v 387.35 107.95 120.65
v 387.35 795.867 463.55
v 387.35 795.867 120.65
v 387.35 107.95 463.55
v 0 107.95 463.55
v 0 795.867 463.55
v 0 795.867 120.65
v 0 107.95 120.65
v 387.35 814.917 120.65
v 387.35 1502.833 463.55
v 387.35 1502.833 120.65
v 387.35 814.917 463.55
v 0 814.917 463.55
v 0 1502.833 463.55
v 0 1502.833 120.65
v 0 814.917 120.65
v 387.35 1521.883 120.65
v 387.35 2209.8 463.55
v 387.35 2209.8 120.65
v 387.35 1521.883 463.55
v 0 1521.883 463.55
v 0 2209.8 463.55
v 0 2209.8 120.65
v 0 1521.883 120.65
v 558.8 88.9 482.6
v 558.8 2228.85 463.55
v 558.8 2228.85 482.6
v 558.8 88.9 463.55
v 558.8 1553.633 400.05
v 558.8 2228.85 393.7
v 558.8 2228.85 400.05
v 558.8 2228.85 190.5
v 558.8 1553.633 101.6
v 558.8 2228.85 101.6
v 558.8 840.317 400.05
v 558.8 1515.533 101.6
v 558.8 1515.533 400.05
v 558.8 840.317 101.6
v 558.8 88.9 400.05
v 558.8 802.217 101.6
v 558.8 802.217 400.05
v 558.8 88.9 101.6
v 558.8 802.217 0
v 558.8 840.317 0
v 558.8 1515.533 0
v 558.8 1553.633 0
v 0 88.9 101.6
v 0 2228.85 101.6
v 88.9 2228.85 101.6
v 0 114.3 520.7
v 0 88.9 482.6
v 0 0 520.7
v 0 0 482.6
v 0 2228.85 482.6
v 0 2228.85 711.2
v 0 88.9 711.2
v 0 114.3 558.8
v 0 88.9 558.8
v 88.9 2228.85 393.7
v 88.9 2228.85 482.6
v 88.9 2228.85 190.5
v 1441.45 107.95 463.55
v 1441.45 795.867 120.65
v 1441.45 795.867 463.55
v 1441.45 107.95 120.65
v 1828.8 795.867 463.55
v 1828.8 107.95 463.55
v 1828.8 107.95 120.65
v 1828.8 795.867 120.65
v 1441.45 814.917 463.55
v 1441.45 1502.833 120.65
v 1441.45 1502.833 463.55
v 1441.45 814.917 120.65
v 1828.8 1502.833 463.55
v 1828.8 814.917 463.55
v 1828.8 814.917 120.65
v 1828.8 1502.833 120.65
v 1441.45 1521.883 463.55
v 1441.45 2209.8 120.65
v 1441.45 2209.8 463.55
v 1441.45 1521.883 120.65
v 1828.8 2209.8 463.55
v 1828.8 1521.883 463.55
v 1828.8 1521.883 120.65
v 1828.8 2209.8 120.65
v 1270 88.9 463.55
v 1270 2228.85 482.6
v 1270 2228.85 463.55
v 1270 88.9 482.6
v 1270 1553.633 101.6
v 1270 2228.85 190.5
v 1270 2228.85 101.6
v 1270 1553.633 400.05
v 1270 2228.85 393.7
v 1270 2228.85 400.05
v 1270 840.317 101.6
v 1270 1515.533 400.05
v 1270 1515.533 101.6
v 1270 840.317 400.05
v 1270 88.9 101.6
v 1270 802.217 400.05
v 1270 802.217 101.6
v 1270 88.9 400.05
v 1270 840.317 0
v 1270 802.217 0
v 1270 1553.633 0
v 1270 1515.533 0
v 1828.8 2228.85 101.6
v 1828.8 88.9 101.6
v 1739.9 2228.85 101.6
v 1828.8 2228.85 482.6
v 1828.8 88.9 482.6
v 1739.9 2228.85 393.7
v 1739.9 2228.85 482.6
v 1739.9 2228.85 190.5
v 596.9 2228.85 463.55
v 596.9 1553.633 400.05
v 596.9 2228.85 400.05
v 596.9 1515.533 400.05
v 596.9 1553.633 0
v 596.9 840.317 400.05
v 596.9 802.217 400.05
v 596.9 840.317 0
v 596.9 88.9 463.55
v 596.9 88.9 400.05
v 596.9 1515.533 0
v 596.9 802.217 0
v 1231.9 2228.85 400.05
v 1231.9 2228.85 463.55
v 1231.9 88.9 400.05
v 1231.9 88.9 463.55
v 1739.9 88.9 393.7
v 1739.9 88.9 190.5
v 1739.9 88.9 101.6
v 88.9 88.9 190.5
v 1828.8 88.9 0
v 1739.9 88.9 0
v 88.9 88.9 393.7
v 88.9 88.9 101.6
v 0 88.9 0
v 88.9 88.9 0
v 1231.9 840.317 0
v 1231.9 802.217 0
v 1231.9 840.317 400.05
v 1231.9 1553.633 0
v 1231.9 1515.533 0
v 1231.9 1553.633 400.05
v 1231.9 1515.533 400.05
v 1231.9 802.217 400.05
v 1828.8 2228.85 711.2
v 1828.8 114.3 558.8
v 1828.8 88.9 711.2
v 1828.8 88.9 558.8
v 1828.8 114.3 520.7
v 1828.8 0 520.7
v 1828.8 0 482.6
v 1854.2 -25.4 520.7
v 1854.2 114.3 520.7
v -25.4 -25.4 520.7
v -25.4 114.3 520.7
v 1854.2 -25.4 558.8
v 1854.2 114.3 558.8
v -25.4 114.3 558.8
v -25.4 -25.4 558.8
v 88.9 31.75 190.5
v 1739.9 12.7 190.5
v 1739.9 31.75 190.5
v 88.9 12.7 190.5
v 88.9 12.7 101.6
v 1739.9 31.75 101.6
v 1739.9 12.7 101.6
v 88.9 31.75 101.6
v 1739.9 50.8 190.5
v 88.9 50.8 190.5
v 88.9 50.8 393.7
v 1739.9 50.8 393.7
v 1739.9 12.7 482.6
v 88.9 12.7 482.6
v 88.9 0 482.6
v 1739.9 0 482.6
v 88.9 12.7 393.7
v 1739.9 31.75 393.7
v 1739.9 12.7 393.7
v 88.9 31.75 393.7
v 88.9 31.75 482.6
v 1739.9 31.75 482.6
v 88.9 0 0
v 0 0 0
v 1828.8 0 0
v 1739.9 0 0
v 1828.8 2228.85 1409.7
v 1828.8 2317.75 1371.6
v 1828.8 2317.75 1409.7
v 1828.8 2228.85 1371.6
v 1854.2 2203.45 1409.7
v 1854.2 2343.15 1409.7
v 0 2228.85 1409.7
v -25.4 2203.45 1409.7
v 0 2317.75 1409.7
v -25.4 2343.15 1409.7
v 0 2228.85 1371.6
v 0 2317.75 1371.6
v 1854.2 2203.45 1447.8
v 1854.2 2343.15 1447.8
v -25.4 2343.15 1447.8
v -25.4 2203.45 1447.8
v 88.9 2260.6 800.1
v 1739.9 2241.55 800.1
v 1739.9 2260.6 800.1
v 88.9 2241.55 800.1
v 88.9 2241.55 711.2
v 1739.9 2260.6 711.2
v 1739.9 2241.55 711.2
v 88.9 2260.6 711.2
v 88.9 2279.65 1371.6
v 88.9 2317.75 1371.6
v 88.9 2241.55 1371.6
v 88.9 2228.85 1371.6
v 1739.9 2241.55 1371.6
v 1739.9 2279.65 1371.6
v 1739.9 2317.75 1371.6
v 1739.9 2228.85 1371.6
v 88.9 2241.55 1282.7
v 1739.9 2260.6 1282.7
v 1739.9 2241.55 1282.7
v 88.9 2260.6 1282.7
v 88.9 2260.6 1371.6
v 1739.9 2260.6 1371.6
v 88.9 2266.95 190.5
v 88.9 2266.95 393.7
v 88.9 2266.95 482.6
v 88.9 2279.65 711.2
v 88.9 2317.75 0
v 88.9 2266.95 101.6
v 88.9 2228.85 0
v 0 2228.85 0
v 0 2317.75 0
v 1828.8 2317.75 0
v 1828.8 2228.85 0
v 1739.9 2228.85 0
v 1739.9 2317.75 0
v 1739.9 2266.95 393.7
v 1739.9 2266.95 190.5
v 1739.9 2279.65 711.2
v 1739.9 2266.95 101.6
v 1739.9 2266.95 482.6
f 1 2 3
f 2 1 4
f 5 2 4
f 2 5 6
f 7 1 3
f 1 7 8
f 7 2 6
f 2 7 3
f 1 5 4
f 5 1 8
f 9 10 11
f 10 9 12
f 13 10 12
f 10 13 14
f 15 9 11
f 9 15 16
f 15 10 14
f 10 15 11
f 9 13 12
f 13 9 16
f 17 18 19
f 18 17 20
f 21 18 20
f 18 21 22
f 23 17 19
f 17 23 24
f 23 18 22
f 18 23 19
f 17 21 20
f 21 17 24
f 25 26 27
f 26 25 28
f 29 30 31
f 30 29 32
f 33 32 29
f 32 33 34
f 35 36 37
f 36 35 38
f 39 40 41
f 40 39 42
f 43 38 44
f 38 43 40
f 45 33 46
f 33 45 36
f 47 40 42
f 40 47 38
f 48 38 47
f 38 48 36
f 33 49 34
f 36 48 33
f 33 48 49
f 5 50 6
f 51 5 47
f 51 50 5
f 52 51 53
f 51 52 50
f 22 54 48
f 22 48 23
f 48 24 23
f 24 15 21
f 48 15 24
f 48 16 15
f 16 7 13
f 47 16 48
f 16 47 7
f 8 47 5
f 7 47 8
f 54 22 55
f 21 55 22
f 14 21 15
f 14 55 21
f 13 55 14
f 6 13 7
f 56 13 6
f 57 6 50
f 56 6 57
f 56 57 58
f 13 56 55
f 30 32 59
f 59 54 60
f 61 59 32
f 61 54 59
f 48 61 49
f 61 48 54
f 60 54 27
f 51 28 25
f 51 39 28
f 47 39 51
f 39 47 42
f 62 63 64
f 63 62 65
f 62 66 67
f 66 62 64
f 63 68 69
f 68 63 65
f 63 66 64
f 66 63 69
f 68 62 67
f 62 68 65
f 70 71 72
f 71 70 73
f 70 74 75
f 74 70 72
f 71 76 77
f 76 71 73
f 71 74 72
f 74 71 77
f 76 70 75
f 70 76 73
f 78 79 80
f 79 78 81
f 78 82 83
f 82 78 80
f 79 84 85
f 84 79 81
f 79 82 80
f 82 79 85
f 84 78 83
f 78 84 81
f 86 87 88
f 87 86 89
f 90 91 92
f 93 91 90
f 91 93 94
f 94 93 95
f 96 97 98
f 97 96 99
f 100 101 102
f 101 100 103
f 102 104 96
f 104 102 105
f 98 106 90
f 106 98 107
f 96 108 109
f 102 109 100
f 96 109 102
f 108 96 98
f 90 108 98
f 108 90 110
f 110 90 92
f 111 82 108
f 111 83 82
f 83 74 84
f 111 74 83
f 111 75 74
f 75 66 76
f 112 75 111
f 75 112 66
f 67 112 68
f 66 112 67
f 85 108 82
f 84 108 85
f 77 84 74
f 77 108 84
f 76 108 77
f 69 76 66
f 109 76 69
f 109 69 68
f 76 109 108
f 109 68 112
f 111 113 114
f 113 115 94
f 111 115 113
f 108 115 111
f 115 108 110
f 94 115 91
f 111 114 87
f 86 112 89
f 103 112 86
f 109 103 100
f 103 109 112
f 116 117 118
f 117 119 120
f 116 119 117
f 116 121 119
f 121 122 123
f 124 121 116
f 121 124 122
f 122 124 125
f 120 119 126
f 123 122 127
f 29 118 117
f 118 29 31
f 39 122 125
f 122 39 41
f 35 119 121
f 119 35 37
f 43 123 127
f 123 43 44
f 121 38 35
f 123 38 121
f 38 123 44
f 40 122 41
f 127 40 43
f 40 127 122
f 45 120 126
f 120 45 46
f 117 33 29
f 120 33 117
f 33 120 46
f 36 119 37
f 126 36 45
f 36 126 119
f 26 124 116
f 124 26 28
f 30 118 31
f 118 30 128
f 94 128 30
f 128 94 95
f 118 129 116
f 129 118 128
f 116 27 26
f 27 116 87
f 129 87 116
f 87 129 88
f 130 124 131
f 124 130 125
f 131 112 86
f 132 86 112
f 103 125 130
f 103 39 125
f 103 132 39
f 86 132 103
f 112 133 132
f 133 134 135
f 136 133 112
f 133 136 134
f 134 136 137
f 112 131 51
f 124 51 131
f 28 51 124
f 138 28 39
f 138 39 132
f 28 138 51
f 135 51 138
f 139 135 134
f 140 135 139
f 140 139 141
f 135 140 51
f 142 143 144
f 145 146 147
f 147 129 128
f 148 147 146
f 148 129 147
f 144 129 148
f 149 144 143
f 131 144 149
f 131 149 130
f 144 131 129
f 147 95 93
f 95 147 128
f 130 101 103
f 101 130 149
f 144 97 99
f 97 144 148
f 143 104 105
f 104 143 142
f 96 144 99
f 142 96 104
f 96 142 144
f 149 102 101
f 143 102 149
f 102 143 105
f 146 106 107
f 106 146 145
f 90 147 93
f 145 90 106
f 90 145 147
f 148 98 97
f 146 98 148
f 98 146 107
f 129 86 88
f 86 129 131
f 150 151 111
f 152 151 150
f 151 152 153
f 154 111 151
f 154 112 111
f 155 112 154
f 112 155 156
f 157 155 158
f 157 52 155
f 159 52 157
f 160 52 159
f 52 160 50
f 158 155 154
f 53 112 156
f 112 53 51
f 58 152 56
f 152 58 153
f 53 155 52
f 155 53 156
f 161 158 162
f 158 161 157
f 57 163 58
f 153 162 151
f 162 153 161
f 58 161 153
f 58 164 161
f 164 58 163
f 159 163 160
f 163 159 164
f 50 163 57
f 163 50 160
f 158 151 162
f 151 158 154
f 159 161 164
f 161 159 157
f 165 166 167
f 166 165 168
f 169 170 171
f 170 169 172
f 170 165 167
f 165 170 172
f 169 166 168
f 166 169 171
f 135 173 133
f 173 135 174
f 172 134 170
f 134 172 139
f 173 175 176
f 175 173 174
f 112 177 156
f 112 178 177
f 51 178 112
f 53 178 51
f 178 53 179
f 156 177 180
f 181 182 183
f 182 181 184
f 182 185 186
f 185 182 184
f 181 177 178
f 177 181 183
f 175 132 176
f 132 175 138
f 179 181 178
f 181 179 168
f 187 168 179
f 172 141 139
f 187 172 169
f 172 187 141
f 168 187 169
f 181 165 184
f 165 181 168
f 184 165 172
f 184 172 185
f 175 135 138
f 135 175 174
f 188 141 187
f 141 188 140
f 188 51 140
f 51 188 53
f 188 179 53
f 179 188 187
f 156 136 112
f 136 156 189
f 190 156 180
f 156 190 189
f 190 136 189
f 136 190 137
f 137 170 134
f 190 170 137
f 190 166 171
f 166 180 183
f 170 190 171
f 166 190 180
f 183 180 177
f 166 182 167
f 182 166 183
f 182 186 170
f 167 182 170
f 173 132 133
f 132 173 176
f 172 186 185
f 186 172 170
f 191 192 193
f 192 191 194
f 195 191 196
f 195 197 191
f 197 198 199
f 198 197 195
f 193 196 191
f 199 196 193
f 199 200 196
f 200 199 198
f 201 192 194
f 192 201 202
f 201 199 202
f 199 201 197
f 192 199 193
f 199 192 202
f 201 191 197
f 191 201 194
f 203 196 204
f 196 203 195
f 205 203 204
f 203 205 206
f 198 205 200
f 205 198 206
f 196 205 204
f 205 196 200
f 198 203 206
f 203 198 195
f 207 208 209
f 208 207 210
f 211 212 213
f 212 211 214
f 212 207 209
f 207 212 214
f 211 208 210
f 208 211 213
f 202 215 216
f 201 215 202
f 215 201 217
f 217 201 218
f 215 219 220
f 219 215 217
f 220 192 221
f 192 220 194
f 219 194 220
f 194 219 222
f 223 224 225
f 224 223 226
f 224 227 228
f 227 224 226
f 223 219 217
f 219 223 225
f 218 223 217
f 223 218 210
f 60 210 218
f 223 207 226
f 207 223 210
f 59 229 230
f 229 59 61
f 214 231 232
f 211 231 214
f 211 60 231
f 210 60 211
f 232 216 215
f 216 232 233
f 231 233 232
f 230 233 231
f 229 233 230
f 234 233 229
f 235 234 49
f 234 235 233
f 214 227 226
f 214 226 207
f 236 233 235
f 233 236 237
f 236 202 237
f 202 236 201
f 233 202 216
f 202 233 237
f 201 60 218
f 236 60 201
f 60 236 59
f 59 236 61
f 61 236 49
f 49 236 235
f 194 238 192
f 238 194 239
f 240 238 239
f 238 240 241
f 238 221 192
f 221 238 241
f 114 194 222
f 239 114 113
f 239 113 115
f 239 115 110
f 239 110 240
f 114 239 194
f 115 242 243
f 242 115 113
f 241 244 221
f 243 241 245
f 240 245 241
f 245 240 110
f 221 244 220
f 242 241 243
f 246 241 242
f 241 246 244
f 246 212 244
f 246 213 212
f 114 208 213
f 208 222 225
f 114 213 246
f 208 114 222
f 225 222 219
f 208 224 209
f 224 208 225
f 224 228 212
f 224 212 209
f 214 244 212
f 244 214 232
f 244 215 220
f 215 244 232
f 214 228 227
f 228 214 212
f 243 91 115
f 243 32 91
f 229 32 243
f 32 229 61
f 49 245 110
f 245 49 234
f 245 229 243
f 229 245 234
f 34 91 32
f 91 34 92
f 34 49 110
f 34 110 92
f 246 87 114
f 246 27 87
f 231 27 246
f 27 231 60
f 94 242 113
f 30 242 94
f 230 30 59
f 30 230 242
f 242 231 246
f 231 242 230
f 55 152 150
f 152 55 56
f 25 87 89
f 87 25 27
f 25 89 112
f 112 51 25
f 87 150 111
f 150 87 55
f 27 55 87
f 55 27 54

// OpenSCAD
bed_dims=[feet(6),feet(7)+inches(.25),inches(9)];
storage_depth=inches(22);
plywood="burlywood";
cedar="sandybrown";

inner_gap=bed_dims[0]-(storage_depth*2);

echo(str("Inner Gap: ",inner_gap/25.4,"in"));

bed();
storage();
supports();
footboard();
headboard();

module footboard(main_h=inches(15),main_offz=0) {
  echo(str("Panel Size: ", (bed_dims[0]-inches(7))/25.4,"x",(main_h)/25.4,"in"));
  // plywood
  color(plywood) {
    // main panel
    translate([inches(3.5),inches(1.25),inches(4)+main_offz]) {
      cube([bed_dims[0]-inches(7),inches(3/4),main_h]);
    }
  }
  // cedar
  color(cedar) {
    translate([0,0,inches(4)+main_h+main_offz])
    {
      cube([bed_dims[0],inches(3.5),inches(1.5)]);
      translate([inches(-1),inches(-1),inches(1.5)])
        cube([bed_dims[0]+inches(2),inches(5.5),inches(1.5)]);
    }
    // outer stretchers
    for(z=[inches(4)+main_offz,inches(4)+main_h+main_offz-inches(3.5)])
    {
      translate([inches(3.5),inches(.5),z]) cube([bed_dims[0]-inches(7),inches(3/4),inches(3.5)]);
    // inner stretchers
//    for(z=[inches(4),inches(15.5)])
      if(main_offz==0)
      translate([inches(3.5),inches(2),z]) cube([bed_dims[0]-inches(7),inches(1.5),inches(3.5)]);
    }
    //posts
    mirrorx(bed_dims[0]/2) cube([inches(3.5),inches(3.5),inches(4)+main_h+main_offz]);
  }
}
module headboard() {
  //54
  translate([0,bed_dims[1]+inches(3.5)]) footboard(inches(26),inches(24));
  color(cedar)
  for(z=[inches(4),inches(19-3.5)]) translate([inches(3.5),bed_dims[1]+inches(3.5),z]) cube([bed_dims[0]-inches(7),inches(1.5),inches(3.5)]);
}

module bed() {
  color("white")
  translate([0,inches(3.5),inches(19)]) cube(bed_dims);
}

module supports() {
  leg_off=bed_dims[1]/3;
  mirrorx(bed_dims[0]/2)
  {
    color(cedar)
    translate([storage_depth,inches(3.5),inches(19-2.5-3/4)]) cube([inches(1.5),bed_dims[1],inches(2.5)]);
    for(y=[leg_off+inches(3.5):leg_off:bed_dims[1]-5])
      translate([storage_depth,y,0]) cube([inches(1.5),inches(1.5),inches(19-2.5-3/4)]);
  }
}
module storage() {
  box_w=(bed_dims[1]-(inches(3/4)))/3;
  echo(str("Box Width: ", (box_w/25.4), "in"));
  mirrorx(bed_dims[0]/2)
  {
    color(plywood)
    translate([0,inches(3.5),inches(4)]) difference() {
      cube([storage_depth, bed_dims[1],inches(15)]);
      for(y=[inches(3/4):box_w:bed_dims[0]])
      translate([-1,y,inches(3/4)]) cube([inches(15.25)+1,box_w-inches(3/4),inches(13.5)]);
    }
  }
}


module mirrorz(offset=0)
{
  translate([0,0,offset]) for(m=[0,1]) mirror([0,0,m]) translate([0,0,offset*-1]) children();
}
module mirrory(offset=0)
{
  translate([0,offset,0]) for(m=[0,1]) mirror([0,m,0]) translate([0,offset*-1,0]) children();
}
module mirrorx(offset=0)
{
  translate([offset,0]) for(m=[0,1]) mirror([m,0]) translate([offset*-1,0]) children();
}

function feet(ft) = inches(12) * ft;
function inches(in) = in * 25.4;
